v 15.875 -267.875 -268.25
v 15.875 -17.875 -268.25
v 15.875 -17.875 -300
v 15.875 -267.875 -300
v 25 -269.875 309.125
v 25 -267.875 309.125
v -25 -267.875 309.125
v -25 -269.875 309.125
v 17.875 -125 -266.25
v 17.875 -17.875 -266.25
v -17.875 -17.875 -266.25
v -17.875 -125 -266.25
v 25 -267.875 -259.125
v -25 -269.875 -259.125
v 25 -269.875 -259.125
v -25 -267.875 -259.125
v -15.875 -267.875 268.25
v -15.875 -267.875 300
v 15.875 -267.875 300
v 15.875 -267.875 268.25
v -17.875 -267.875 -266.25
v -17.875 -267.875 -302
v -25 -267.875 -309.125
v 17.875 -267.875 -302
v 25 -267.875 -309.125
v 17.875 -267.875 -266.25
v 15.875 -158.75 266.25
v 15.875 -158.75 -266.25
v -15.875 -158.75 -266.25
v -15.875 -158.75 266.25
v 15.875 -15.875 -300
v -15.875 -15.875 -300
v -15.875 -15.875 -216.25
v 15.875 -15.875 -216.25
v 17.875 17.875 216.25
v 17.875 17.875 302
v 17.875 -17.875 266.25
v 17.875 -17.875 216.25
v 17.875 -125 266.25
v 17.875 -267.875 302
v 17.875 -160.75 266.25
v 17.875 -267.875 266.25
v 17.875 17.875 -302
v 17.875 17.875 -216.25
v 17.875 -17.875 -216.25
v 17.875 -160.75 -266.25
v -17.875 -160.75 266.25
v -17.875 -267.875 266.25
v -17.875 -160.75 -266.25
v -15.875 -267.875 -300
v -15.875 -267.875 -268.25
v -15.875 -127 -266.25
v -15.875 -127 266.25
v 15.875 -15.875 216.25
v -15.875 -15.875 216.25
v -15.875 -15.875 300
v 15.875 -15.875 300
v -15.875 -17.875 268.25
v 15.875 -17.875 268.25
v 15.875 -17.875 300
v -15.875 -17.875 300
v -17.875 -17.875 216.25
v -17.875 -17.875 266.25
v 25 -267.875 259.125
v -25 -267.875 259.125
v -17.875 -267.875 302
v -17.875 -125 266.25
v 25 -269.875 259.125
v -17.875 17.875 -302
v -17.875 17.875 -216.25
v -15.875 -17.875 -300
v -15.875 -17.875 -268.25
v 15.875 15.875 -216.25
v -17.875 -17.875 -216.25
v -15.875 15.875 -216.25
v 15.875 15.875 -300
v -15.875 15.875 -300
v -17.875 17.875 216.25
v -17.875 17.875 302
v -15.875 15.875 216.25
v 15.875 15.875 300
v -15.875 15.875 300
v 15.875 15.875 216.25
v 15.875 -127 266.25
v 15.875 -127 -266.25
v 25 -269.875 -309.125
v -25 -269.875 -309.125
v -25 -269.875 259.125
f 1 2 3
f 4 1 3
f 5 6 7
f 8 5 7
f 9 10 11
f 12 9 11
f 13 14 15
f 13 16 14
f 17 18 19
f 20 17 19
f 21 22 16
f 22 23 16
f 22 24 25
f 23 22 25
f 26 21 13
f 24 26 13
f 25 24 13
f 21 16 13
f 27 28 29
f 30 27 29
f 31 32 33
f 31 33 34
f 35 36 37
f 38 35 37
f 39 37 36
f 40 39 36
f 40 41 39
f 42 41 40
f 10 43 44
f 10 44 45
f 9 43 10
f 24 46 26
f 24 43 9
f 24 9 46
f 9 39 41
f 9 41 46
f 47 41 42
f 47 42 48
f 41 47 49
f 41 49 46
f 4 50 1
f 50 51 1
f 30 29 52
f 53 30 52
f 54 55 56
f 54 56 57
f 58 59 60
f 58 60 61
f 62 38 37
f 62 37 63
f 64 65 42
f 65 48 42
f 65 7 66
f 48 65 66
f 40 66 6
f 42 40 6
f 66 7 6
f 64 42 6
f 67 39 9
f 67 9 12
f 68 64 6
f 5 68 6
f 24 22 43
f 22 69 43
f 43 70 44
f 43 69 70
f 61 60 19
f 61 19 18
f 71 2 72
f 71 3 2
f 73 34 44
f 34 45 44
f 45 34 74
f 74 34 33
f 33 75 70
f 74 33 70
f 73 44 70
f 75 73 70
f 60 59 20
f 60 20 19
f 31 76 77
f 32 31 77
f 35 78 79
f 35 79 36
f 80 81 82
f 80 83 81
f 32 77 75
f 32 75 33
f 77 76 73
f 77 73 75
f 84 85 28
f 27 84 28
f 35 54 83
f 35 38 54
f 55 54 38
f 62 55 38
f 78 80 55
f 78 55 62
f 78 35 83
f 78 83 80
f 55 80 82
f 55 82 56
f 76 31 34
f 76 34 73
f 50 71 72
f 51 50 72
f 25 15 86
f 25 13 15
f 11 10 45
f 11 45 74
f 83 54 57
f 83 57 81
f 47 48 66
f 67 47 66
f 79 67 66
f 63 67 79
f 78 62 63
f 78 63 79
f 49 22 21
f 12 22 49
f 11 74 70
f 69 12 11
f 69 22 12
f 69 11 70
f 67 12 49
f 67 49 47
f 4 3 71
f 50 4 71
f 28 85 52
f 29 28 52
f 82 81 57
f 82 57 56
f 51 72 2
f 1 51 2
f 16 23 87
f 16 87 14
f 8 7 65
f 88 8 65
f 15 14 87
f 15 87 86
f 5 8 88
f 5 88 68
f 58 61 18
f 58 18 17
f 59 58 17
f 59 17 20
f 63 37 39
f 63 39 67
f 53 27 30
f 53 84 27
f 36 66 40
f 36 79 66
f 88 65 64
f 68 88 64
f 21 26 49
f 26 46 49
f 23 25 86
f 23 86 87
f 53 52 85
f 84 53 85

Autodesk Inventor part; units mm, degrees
ref_plane "YZ Plane" through (0, 0, 0) normal (1, 0, 0) x (0, 1, 0)
ref_plane "XZ Plane" through (0, 0, 0) normal (0, 1, 0) x (-1, 0, 0)
ref_plane "XY Plane" through (0, 0, 0) normal (0, 0, 1) x (1, 0, 0)
sketch "Boceto1" plane through (0, 0, 0) normal (0, 0, 1) x (1, 0, 0)
  line L0 (-15.875, -15.875) -> (15.875, -15.875)
  line L1 (15.875, -15.875) -> (15.875, 15.875)
  line L2 (15.875, 15.875) -> (-15.875, 15.875)
  line L3 (-15.875, 15.875) -> (-15.875, -15.875)
  line L4 (-15.875, -15.875) -> (15.875, 15.875) construction
  line L5 (15.875, -15.875) -> (-15.875, 15.875) construction
  line L6 (-17.875, 17.875) -> (17.875, 17.875)
  line L7 (17.875, 17.875) -> (17.875, -17.875)
  line L8 (17.875, -17.875) -> (-17.875, -17.875)
  line L9 (-17.875, -17.875) -> (-17.875, 17.875)
  point P0 (0, 0)
  dimension "d0" = 31.75
  dimension "d1" = 31.75
  dimension "d2" = 2
extrude "Extrusión1" add sketch "Boceto1" along normal mid plane 604
sketch "Boceto2" plane through (-17.875, -17.875, 302) normal (0, -1, 0) x (1, 0, 0)
  line L0 (0, 0) -> (35.75, 0) projected
  line L1 (0, 0) -> (35.75, 0)
  line L2 (35.75, 0) -> (35.75, -35.75)
  line L3 (35.75, -35.75) -> (0, -35.75)
  line L4 (0, -35.75) -> (0, 0)
  line L5 (33.75, -33.75) -> (33.75, -2)
  line L6 (33.75, -2) -> (2, -2)
  line L7 (2, -2) -> (2, -33.75)
  line L8 (2, -33.75) -> (33.75, -33.75)
  line L9 (35.75, -604) -> (35.75, 0) projected
  line L10 (0, -604) -> (35.75, -604)
  line L11 (35.75, -604) -> (35.75, -568.25)
  line L12 (35.75, -568.25) -> (0, -568.25)
  line L13 (0, -568.25) -> (0, -604)
  line L14 (33.75, -570.25) -> (33.75, -602)
  line L15 (33.75, -602) -> (2, -602)
  line L16 (2, -602) -> (2, -570.25)
  line L17 (2, -570.25) -> (33.75, -570.25)
  point P0 (17.875, -302)
  dimension "d5" = 35.75
  dimension "d6" = 35.75
  dimension "d7" = 2
extrude "Extrusión2" add sketch "Boceto2" along normal blind 250 and the other way blind 35.75
sketch "Boceto3" plane through (-17.875, -17.875, -266.25) normal (0, 0, 1) x (1, 0, 0)
  line L0 (35.75, 35.75) -> (35.75, -250) projected
  line L1 (35.75, -107.125) -> (0, -107.125)
  line L2 (0, -107.125) -> (0, -142.875)
  line L3 (0, -142.875) -> (35.75, -142.875)
  line L4 (35.75, -142.875) -> (35.75, -107.125)
  line L5 (2, -109.125) -> (33.75, -109.125)
  line L6 (33.75, -109.125) -> (33.75, -140.875)
  line L7 (33.75, -140.875) -> (2, -140.875)
  line L8 (2, -140.875) -> (2, -109.125)
  point P0 (17.875, 17.875)
  point P1 (35.75, -142.875)
  dimension "d12" = 35.75
  dimension "d13" = 35.75
  dimension "d14" = 2
extrude "Extrusión3" add sketch "Boceto3" along normal blind 532.5
sketch "Boceto4" plane through (-17.875, 17.875, 302) normal (0, 1, 0) x (1, 0, 0)
  line L0 (0, 568.25) -> (35.75, 568.25) projected
  line L1 (35.75, 604) -> (35.75, 0) projected
  line L2 (35.75, 518.25) -> (0, 518.25)
  line L3 (0, 604) -> (0, 0) projected
  line L4 (17.875, 302) -> (67.1432, 302)
  line L5 (35.75, 85.75) -> (0, 85.75)
  line L6 (0, 518.25) -> (0, 85.75)
  line L7 (35.75, 85.75) -> (35.75, 518.25)
  dimension "d17" = 50
extrude "Extrusión4" cut sketch "Boceto4" against normal blind 40 contours L2 L1 L5 L3
sketch "Boceto5" plane through (-17.875, -267.875, 302) normal (0, -1, 0) x (1, 0, 0)
  line L0 (33.75, -33.75) -> (33.75, -2) projected
  line L1 (33.75, -2) -> (2, -2) projected
  line L2 (-7.125, -42.875) -> (42.875, -42.875)
  line L3 (42.875, -42.875) -> (42.875, 7.125)
  line L4 (42.875, 7.125) -> (-7.125, 7.125)
  line L5 (-7.125, 7.125) -> (-7.125, -42.875)
  line L6 (-7.125, -42.875) -> (42.875, 7.125) construction
  line L7 (42.875, -42.875) -> (-7.125, 7.125) construction
  line L8 (-7.125, -561.125) -> (42.875, -561.125)
  line L9 (42.875, -561.125) -> (42.875, -611.125)
  line L10 (42.875, -611.125) -> (-7.125, -611.125)
  line L11 (-7.125, -611.125) -> (-7.125, -561.125)
  point P0 (17.875, -302)
  point P1 (17.875, -17.875)
  dimension "d20" = 50
  dimension "d21" = 50
extrude "Extrusión5" add sketch "Boceto5" along normal blind 2
sketch "Boceto6" plane through (-15.875, -15.875, -266.25) normal (0, 0, 1) x (1, 0, 0)
  line L0 (0, 31.75) -> (31.75, 31.75) projected
  line L1 (31.75, 31.75) -> (31.75, 0) projected
  line L2 (0, 31.75) -> (31.75, 31.75)
  line L3 (31.75, 31.75) -> (31.75, 0)
  line L4 (31.75, 0) -> (0, 0)
  line L5 (0, 0) -> (0, 31.75)
  point P0 (15.875, 15.875)
extrude "Extrusión6" cut sketch "Boceto6" along normal blind 550 and the other way blind 10
properties part number "Soporte_altura"
